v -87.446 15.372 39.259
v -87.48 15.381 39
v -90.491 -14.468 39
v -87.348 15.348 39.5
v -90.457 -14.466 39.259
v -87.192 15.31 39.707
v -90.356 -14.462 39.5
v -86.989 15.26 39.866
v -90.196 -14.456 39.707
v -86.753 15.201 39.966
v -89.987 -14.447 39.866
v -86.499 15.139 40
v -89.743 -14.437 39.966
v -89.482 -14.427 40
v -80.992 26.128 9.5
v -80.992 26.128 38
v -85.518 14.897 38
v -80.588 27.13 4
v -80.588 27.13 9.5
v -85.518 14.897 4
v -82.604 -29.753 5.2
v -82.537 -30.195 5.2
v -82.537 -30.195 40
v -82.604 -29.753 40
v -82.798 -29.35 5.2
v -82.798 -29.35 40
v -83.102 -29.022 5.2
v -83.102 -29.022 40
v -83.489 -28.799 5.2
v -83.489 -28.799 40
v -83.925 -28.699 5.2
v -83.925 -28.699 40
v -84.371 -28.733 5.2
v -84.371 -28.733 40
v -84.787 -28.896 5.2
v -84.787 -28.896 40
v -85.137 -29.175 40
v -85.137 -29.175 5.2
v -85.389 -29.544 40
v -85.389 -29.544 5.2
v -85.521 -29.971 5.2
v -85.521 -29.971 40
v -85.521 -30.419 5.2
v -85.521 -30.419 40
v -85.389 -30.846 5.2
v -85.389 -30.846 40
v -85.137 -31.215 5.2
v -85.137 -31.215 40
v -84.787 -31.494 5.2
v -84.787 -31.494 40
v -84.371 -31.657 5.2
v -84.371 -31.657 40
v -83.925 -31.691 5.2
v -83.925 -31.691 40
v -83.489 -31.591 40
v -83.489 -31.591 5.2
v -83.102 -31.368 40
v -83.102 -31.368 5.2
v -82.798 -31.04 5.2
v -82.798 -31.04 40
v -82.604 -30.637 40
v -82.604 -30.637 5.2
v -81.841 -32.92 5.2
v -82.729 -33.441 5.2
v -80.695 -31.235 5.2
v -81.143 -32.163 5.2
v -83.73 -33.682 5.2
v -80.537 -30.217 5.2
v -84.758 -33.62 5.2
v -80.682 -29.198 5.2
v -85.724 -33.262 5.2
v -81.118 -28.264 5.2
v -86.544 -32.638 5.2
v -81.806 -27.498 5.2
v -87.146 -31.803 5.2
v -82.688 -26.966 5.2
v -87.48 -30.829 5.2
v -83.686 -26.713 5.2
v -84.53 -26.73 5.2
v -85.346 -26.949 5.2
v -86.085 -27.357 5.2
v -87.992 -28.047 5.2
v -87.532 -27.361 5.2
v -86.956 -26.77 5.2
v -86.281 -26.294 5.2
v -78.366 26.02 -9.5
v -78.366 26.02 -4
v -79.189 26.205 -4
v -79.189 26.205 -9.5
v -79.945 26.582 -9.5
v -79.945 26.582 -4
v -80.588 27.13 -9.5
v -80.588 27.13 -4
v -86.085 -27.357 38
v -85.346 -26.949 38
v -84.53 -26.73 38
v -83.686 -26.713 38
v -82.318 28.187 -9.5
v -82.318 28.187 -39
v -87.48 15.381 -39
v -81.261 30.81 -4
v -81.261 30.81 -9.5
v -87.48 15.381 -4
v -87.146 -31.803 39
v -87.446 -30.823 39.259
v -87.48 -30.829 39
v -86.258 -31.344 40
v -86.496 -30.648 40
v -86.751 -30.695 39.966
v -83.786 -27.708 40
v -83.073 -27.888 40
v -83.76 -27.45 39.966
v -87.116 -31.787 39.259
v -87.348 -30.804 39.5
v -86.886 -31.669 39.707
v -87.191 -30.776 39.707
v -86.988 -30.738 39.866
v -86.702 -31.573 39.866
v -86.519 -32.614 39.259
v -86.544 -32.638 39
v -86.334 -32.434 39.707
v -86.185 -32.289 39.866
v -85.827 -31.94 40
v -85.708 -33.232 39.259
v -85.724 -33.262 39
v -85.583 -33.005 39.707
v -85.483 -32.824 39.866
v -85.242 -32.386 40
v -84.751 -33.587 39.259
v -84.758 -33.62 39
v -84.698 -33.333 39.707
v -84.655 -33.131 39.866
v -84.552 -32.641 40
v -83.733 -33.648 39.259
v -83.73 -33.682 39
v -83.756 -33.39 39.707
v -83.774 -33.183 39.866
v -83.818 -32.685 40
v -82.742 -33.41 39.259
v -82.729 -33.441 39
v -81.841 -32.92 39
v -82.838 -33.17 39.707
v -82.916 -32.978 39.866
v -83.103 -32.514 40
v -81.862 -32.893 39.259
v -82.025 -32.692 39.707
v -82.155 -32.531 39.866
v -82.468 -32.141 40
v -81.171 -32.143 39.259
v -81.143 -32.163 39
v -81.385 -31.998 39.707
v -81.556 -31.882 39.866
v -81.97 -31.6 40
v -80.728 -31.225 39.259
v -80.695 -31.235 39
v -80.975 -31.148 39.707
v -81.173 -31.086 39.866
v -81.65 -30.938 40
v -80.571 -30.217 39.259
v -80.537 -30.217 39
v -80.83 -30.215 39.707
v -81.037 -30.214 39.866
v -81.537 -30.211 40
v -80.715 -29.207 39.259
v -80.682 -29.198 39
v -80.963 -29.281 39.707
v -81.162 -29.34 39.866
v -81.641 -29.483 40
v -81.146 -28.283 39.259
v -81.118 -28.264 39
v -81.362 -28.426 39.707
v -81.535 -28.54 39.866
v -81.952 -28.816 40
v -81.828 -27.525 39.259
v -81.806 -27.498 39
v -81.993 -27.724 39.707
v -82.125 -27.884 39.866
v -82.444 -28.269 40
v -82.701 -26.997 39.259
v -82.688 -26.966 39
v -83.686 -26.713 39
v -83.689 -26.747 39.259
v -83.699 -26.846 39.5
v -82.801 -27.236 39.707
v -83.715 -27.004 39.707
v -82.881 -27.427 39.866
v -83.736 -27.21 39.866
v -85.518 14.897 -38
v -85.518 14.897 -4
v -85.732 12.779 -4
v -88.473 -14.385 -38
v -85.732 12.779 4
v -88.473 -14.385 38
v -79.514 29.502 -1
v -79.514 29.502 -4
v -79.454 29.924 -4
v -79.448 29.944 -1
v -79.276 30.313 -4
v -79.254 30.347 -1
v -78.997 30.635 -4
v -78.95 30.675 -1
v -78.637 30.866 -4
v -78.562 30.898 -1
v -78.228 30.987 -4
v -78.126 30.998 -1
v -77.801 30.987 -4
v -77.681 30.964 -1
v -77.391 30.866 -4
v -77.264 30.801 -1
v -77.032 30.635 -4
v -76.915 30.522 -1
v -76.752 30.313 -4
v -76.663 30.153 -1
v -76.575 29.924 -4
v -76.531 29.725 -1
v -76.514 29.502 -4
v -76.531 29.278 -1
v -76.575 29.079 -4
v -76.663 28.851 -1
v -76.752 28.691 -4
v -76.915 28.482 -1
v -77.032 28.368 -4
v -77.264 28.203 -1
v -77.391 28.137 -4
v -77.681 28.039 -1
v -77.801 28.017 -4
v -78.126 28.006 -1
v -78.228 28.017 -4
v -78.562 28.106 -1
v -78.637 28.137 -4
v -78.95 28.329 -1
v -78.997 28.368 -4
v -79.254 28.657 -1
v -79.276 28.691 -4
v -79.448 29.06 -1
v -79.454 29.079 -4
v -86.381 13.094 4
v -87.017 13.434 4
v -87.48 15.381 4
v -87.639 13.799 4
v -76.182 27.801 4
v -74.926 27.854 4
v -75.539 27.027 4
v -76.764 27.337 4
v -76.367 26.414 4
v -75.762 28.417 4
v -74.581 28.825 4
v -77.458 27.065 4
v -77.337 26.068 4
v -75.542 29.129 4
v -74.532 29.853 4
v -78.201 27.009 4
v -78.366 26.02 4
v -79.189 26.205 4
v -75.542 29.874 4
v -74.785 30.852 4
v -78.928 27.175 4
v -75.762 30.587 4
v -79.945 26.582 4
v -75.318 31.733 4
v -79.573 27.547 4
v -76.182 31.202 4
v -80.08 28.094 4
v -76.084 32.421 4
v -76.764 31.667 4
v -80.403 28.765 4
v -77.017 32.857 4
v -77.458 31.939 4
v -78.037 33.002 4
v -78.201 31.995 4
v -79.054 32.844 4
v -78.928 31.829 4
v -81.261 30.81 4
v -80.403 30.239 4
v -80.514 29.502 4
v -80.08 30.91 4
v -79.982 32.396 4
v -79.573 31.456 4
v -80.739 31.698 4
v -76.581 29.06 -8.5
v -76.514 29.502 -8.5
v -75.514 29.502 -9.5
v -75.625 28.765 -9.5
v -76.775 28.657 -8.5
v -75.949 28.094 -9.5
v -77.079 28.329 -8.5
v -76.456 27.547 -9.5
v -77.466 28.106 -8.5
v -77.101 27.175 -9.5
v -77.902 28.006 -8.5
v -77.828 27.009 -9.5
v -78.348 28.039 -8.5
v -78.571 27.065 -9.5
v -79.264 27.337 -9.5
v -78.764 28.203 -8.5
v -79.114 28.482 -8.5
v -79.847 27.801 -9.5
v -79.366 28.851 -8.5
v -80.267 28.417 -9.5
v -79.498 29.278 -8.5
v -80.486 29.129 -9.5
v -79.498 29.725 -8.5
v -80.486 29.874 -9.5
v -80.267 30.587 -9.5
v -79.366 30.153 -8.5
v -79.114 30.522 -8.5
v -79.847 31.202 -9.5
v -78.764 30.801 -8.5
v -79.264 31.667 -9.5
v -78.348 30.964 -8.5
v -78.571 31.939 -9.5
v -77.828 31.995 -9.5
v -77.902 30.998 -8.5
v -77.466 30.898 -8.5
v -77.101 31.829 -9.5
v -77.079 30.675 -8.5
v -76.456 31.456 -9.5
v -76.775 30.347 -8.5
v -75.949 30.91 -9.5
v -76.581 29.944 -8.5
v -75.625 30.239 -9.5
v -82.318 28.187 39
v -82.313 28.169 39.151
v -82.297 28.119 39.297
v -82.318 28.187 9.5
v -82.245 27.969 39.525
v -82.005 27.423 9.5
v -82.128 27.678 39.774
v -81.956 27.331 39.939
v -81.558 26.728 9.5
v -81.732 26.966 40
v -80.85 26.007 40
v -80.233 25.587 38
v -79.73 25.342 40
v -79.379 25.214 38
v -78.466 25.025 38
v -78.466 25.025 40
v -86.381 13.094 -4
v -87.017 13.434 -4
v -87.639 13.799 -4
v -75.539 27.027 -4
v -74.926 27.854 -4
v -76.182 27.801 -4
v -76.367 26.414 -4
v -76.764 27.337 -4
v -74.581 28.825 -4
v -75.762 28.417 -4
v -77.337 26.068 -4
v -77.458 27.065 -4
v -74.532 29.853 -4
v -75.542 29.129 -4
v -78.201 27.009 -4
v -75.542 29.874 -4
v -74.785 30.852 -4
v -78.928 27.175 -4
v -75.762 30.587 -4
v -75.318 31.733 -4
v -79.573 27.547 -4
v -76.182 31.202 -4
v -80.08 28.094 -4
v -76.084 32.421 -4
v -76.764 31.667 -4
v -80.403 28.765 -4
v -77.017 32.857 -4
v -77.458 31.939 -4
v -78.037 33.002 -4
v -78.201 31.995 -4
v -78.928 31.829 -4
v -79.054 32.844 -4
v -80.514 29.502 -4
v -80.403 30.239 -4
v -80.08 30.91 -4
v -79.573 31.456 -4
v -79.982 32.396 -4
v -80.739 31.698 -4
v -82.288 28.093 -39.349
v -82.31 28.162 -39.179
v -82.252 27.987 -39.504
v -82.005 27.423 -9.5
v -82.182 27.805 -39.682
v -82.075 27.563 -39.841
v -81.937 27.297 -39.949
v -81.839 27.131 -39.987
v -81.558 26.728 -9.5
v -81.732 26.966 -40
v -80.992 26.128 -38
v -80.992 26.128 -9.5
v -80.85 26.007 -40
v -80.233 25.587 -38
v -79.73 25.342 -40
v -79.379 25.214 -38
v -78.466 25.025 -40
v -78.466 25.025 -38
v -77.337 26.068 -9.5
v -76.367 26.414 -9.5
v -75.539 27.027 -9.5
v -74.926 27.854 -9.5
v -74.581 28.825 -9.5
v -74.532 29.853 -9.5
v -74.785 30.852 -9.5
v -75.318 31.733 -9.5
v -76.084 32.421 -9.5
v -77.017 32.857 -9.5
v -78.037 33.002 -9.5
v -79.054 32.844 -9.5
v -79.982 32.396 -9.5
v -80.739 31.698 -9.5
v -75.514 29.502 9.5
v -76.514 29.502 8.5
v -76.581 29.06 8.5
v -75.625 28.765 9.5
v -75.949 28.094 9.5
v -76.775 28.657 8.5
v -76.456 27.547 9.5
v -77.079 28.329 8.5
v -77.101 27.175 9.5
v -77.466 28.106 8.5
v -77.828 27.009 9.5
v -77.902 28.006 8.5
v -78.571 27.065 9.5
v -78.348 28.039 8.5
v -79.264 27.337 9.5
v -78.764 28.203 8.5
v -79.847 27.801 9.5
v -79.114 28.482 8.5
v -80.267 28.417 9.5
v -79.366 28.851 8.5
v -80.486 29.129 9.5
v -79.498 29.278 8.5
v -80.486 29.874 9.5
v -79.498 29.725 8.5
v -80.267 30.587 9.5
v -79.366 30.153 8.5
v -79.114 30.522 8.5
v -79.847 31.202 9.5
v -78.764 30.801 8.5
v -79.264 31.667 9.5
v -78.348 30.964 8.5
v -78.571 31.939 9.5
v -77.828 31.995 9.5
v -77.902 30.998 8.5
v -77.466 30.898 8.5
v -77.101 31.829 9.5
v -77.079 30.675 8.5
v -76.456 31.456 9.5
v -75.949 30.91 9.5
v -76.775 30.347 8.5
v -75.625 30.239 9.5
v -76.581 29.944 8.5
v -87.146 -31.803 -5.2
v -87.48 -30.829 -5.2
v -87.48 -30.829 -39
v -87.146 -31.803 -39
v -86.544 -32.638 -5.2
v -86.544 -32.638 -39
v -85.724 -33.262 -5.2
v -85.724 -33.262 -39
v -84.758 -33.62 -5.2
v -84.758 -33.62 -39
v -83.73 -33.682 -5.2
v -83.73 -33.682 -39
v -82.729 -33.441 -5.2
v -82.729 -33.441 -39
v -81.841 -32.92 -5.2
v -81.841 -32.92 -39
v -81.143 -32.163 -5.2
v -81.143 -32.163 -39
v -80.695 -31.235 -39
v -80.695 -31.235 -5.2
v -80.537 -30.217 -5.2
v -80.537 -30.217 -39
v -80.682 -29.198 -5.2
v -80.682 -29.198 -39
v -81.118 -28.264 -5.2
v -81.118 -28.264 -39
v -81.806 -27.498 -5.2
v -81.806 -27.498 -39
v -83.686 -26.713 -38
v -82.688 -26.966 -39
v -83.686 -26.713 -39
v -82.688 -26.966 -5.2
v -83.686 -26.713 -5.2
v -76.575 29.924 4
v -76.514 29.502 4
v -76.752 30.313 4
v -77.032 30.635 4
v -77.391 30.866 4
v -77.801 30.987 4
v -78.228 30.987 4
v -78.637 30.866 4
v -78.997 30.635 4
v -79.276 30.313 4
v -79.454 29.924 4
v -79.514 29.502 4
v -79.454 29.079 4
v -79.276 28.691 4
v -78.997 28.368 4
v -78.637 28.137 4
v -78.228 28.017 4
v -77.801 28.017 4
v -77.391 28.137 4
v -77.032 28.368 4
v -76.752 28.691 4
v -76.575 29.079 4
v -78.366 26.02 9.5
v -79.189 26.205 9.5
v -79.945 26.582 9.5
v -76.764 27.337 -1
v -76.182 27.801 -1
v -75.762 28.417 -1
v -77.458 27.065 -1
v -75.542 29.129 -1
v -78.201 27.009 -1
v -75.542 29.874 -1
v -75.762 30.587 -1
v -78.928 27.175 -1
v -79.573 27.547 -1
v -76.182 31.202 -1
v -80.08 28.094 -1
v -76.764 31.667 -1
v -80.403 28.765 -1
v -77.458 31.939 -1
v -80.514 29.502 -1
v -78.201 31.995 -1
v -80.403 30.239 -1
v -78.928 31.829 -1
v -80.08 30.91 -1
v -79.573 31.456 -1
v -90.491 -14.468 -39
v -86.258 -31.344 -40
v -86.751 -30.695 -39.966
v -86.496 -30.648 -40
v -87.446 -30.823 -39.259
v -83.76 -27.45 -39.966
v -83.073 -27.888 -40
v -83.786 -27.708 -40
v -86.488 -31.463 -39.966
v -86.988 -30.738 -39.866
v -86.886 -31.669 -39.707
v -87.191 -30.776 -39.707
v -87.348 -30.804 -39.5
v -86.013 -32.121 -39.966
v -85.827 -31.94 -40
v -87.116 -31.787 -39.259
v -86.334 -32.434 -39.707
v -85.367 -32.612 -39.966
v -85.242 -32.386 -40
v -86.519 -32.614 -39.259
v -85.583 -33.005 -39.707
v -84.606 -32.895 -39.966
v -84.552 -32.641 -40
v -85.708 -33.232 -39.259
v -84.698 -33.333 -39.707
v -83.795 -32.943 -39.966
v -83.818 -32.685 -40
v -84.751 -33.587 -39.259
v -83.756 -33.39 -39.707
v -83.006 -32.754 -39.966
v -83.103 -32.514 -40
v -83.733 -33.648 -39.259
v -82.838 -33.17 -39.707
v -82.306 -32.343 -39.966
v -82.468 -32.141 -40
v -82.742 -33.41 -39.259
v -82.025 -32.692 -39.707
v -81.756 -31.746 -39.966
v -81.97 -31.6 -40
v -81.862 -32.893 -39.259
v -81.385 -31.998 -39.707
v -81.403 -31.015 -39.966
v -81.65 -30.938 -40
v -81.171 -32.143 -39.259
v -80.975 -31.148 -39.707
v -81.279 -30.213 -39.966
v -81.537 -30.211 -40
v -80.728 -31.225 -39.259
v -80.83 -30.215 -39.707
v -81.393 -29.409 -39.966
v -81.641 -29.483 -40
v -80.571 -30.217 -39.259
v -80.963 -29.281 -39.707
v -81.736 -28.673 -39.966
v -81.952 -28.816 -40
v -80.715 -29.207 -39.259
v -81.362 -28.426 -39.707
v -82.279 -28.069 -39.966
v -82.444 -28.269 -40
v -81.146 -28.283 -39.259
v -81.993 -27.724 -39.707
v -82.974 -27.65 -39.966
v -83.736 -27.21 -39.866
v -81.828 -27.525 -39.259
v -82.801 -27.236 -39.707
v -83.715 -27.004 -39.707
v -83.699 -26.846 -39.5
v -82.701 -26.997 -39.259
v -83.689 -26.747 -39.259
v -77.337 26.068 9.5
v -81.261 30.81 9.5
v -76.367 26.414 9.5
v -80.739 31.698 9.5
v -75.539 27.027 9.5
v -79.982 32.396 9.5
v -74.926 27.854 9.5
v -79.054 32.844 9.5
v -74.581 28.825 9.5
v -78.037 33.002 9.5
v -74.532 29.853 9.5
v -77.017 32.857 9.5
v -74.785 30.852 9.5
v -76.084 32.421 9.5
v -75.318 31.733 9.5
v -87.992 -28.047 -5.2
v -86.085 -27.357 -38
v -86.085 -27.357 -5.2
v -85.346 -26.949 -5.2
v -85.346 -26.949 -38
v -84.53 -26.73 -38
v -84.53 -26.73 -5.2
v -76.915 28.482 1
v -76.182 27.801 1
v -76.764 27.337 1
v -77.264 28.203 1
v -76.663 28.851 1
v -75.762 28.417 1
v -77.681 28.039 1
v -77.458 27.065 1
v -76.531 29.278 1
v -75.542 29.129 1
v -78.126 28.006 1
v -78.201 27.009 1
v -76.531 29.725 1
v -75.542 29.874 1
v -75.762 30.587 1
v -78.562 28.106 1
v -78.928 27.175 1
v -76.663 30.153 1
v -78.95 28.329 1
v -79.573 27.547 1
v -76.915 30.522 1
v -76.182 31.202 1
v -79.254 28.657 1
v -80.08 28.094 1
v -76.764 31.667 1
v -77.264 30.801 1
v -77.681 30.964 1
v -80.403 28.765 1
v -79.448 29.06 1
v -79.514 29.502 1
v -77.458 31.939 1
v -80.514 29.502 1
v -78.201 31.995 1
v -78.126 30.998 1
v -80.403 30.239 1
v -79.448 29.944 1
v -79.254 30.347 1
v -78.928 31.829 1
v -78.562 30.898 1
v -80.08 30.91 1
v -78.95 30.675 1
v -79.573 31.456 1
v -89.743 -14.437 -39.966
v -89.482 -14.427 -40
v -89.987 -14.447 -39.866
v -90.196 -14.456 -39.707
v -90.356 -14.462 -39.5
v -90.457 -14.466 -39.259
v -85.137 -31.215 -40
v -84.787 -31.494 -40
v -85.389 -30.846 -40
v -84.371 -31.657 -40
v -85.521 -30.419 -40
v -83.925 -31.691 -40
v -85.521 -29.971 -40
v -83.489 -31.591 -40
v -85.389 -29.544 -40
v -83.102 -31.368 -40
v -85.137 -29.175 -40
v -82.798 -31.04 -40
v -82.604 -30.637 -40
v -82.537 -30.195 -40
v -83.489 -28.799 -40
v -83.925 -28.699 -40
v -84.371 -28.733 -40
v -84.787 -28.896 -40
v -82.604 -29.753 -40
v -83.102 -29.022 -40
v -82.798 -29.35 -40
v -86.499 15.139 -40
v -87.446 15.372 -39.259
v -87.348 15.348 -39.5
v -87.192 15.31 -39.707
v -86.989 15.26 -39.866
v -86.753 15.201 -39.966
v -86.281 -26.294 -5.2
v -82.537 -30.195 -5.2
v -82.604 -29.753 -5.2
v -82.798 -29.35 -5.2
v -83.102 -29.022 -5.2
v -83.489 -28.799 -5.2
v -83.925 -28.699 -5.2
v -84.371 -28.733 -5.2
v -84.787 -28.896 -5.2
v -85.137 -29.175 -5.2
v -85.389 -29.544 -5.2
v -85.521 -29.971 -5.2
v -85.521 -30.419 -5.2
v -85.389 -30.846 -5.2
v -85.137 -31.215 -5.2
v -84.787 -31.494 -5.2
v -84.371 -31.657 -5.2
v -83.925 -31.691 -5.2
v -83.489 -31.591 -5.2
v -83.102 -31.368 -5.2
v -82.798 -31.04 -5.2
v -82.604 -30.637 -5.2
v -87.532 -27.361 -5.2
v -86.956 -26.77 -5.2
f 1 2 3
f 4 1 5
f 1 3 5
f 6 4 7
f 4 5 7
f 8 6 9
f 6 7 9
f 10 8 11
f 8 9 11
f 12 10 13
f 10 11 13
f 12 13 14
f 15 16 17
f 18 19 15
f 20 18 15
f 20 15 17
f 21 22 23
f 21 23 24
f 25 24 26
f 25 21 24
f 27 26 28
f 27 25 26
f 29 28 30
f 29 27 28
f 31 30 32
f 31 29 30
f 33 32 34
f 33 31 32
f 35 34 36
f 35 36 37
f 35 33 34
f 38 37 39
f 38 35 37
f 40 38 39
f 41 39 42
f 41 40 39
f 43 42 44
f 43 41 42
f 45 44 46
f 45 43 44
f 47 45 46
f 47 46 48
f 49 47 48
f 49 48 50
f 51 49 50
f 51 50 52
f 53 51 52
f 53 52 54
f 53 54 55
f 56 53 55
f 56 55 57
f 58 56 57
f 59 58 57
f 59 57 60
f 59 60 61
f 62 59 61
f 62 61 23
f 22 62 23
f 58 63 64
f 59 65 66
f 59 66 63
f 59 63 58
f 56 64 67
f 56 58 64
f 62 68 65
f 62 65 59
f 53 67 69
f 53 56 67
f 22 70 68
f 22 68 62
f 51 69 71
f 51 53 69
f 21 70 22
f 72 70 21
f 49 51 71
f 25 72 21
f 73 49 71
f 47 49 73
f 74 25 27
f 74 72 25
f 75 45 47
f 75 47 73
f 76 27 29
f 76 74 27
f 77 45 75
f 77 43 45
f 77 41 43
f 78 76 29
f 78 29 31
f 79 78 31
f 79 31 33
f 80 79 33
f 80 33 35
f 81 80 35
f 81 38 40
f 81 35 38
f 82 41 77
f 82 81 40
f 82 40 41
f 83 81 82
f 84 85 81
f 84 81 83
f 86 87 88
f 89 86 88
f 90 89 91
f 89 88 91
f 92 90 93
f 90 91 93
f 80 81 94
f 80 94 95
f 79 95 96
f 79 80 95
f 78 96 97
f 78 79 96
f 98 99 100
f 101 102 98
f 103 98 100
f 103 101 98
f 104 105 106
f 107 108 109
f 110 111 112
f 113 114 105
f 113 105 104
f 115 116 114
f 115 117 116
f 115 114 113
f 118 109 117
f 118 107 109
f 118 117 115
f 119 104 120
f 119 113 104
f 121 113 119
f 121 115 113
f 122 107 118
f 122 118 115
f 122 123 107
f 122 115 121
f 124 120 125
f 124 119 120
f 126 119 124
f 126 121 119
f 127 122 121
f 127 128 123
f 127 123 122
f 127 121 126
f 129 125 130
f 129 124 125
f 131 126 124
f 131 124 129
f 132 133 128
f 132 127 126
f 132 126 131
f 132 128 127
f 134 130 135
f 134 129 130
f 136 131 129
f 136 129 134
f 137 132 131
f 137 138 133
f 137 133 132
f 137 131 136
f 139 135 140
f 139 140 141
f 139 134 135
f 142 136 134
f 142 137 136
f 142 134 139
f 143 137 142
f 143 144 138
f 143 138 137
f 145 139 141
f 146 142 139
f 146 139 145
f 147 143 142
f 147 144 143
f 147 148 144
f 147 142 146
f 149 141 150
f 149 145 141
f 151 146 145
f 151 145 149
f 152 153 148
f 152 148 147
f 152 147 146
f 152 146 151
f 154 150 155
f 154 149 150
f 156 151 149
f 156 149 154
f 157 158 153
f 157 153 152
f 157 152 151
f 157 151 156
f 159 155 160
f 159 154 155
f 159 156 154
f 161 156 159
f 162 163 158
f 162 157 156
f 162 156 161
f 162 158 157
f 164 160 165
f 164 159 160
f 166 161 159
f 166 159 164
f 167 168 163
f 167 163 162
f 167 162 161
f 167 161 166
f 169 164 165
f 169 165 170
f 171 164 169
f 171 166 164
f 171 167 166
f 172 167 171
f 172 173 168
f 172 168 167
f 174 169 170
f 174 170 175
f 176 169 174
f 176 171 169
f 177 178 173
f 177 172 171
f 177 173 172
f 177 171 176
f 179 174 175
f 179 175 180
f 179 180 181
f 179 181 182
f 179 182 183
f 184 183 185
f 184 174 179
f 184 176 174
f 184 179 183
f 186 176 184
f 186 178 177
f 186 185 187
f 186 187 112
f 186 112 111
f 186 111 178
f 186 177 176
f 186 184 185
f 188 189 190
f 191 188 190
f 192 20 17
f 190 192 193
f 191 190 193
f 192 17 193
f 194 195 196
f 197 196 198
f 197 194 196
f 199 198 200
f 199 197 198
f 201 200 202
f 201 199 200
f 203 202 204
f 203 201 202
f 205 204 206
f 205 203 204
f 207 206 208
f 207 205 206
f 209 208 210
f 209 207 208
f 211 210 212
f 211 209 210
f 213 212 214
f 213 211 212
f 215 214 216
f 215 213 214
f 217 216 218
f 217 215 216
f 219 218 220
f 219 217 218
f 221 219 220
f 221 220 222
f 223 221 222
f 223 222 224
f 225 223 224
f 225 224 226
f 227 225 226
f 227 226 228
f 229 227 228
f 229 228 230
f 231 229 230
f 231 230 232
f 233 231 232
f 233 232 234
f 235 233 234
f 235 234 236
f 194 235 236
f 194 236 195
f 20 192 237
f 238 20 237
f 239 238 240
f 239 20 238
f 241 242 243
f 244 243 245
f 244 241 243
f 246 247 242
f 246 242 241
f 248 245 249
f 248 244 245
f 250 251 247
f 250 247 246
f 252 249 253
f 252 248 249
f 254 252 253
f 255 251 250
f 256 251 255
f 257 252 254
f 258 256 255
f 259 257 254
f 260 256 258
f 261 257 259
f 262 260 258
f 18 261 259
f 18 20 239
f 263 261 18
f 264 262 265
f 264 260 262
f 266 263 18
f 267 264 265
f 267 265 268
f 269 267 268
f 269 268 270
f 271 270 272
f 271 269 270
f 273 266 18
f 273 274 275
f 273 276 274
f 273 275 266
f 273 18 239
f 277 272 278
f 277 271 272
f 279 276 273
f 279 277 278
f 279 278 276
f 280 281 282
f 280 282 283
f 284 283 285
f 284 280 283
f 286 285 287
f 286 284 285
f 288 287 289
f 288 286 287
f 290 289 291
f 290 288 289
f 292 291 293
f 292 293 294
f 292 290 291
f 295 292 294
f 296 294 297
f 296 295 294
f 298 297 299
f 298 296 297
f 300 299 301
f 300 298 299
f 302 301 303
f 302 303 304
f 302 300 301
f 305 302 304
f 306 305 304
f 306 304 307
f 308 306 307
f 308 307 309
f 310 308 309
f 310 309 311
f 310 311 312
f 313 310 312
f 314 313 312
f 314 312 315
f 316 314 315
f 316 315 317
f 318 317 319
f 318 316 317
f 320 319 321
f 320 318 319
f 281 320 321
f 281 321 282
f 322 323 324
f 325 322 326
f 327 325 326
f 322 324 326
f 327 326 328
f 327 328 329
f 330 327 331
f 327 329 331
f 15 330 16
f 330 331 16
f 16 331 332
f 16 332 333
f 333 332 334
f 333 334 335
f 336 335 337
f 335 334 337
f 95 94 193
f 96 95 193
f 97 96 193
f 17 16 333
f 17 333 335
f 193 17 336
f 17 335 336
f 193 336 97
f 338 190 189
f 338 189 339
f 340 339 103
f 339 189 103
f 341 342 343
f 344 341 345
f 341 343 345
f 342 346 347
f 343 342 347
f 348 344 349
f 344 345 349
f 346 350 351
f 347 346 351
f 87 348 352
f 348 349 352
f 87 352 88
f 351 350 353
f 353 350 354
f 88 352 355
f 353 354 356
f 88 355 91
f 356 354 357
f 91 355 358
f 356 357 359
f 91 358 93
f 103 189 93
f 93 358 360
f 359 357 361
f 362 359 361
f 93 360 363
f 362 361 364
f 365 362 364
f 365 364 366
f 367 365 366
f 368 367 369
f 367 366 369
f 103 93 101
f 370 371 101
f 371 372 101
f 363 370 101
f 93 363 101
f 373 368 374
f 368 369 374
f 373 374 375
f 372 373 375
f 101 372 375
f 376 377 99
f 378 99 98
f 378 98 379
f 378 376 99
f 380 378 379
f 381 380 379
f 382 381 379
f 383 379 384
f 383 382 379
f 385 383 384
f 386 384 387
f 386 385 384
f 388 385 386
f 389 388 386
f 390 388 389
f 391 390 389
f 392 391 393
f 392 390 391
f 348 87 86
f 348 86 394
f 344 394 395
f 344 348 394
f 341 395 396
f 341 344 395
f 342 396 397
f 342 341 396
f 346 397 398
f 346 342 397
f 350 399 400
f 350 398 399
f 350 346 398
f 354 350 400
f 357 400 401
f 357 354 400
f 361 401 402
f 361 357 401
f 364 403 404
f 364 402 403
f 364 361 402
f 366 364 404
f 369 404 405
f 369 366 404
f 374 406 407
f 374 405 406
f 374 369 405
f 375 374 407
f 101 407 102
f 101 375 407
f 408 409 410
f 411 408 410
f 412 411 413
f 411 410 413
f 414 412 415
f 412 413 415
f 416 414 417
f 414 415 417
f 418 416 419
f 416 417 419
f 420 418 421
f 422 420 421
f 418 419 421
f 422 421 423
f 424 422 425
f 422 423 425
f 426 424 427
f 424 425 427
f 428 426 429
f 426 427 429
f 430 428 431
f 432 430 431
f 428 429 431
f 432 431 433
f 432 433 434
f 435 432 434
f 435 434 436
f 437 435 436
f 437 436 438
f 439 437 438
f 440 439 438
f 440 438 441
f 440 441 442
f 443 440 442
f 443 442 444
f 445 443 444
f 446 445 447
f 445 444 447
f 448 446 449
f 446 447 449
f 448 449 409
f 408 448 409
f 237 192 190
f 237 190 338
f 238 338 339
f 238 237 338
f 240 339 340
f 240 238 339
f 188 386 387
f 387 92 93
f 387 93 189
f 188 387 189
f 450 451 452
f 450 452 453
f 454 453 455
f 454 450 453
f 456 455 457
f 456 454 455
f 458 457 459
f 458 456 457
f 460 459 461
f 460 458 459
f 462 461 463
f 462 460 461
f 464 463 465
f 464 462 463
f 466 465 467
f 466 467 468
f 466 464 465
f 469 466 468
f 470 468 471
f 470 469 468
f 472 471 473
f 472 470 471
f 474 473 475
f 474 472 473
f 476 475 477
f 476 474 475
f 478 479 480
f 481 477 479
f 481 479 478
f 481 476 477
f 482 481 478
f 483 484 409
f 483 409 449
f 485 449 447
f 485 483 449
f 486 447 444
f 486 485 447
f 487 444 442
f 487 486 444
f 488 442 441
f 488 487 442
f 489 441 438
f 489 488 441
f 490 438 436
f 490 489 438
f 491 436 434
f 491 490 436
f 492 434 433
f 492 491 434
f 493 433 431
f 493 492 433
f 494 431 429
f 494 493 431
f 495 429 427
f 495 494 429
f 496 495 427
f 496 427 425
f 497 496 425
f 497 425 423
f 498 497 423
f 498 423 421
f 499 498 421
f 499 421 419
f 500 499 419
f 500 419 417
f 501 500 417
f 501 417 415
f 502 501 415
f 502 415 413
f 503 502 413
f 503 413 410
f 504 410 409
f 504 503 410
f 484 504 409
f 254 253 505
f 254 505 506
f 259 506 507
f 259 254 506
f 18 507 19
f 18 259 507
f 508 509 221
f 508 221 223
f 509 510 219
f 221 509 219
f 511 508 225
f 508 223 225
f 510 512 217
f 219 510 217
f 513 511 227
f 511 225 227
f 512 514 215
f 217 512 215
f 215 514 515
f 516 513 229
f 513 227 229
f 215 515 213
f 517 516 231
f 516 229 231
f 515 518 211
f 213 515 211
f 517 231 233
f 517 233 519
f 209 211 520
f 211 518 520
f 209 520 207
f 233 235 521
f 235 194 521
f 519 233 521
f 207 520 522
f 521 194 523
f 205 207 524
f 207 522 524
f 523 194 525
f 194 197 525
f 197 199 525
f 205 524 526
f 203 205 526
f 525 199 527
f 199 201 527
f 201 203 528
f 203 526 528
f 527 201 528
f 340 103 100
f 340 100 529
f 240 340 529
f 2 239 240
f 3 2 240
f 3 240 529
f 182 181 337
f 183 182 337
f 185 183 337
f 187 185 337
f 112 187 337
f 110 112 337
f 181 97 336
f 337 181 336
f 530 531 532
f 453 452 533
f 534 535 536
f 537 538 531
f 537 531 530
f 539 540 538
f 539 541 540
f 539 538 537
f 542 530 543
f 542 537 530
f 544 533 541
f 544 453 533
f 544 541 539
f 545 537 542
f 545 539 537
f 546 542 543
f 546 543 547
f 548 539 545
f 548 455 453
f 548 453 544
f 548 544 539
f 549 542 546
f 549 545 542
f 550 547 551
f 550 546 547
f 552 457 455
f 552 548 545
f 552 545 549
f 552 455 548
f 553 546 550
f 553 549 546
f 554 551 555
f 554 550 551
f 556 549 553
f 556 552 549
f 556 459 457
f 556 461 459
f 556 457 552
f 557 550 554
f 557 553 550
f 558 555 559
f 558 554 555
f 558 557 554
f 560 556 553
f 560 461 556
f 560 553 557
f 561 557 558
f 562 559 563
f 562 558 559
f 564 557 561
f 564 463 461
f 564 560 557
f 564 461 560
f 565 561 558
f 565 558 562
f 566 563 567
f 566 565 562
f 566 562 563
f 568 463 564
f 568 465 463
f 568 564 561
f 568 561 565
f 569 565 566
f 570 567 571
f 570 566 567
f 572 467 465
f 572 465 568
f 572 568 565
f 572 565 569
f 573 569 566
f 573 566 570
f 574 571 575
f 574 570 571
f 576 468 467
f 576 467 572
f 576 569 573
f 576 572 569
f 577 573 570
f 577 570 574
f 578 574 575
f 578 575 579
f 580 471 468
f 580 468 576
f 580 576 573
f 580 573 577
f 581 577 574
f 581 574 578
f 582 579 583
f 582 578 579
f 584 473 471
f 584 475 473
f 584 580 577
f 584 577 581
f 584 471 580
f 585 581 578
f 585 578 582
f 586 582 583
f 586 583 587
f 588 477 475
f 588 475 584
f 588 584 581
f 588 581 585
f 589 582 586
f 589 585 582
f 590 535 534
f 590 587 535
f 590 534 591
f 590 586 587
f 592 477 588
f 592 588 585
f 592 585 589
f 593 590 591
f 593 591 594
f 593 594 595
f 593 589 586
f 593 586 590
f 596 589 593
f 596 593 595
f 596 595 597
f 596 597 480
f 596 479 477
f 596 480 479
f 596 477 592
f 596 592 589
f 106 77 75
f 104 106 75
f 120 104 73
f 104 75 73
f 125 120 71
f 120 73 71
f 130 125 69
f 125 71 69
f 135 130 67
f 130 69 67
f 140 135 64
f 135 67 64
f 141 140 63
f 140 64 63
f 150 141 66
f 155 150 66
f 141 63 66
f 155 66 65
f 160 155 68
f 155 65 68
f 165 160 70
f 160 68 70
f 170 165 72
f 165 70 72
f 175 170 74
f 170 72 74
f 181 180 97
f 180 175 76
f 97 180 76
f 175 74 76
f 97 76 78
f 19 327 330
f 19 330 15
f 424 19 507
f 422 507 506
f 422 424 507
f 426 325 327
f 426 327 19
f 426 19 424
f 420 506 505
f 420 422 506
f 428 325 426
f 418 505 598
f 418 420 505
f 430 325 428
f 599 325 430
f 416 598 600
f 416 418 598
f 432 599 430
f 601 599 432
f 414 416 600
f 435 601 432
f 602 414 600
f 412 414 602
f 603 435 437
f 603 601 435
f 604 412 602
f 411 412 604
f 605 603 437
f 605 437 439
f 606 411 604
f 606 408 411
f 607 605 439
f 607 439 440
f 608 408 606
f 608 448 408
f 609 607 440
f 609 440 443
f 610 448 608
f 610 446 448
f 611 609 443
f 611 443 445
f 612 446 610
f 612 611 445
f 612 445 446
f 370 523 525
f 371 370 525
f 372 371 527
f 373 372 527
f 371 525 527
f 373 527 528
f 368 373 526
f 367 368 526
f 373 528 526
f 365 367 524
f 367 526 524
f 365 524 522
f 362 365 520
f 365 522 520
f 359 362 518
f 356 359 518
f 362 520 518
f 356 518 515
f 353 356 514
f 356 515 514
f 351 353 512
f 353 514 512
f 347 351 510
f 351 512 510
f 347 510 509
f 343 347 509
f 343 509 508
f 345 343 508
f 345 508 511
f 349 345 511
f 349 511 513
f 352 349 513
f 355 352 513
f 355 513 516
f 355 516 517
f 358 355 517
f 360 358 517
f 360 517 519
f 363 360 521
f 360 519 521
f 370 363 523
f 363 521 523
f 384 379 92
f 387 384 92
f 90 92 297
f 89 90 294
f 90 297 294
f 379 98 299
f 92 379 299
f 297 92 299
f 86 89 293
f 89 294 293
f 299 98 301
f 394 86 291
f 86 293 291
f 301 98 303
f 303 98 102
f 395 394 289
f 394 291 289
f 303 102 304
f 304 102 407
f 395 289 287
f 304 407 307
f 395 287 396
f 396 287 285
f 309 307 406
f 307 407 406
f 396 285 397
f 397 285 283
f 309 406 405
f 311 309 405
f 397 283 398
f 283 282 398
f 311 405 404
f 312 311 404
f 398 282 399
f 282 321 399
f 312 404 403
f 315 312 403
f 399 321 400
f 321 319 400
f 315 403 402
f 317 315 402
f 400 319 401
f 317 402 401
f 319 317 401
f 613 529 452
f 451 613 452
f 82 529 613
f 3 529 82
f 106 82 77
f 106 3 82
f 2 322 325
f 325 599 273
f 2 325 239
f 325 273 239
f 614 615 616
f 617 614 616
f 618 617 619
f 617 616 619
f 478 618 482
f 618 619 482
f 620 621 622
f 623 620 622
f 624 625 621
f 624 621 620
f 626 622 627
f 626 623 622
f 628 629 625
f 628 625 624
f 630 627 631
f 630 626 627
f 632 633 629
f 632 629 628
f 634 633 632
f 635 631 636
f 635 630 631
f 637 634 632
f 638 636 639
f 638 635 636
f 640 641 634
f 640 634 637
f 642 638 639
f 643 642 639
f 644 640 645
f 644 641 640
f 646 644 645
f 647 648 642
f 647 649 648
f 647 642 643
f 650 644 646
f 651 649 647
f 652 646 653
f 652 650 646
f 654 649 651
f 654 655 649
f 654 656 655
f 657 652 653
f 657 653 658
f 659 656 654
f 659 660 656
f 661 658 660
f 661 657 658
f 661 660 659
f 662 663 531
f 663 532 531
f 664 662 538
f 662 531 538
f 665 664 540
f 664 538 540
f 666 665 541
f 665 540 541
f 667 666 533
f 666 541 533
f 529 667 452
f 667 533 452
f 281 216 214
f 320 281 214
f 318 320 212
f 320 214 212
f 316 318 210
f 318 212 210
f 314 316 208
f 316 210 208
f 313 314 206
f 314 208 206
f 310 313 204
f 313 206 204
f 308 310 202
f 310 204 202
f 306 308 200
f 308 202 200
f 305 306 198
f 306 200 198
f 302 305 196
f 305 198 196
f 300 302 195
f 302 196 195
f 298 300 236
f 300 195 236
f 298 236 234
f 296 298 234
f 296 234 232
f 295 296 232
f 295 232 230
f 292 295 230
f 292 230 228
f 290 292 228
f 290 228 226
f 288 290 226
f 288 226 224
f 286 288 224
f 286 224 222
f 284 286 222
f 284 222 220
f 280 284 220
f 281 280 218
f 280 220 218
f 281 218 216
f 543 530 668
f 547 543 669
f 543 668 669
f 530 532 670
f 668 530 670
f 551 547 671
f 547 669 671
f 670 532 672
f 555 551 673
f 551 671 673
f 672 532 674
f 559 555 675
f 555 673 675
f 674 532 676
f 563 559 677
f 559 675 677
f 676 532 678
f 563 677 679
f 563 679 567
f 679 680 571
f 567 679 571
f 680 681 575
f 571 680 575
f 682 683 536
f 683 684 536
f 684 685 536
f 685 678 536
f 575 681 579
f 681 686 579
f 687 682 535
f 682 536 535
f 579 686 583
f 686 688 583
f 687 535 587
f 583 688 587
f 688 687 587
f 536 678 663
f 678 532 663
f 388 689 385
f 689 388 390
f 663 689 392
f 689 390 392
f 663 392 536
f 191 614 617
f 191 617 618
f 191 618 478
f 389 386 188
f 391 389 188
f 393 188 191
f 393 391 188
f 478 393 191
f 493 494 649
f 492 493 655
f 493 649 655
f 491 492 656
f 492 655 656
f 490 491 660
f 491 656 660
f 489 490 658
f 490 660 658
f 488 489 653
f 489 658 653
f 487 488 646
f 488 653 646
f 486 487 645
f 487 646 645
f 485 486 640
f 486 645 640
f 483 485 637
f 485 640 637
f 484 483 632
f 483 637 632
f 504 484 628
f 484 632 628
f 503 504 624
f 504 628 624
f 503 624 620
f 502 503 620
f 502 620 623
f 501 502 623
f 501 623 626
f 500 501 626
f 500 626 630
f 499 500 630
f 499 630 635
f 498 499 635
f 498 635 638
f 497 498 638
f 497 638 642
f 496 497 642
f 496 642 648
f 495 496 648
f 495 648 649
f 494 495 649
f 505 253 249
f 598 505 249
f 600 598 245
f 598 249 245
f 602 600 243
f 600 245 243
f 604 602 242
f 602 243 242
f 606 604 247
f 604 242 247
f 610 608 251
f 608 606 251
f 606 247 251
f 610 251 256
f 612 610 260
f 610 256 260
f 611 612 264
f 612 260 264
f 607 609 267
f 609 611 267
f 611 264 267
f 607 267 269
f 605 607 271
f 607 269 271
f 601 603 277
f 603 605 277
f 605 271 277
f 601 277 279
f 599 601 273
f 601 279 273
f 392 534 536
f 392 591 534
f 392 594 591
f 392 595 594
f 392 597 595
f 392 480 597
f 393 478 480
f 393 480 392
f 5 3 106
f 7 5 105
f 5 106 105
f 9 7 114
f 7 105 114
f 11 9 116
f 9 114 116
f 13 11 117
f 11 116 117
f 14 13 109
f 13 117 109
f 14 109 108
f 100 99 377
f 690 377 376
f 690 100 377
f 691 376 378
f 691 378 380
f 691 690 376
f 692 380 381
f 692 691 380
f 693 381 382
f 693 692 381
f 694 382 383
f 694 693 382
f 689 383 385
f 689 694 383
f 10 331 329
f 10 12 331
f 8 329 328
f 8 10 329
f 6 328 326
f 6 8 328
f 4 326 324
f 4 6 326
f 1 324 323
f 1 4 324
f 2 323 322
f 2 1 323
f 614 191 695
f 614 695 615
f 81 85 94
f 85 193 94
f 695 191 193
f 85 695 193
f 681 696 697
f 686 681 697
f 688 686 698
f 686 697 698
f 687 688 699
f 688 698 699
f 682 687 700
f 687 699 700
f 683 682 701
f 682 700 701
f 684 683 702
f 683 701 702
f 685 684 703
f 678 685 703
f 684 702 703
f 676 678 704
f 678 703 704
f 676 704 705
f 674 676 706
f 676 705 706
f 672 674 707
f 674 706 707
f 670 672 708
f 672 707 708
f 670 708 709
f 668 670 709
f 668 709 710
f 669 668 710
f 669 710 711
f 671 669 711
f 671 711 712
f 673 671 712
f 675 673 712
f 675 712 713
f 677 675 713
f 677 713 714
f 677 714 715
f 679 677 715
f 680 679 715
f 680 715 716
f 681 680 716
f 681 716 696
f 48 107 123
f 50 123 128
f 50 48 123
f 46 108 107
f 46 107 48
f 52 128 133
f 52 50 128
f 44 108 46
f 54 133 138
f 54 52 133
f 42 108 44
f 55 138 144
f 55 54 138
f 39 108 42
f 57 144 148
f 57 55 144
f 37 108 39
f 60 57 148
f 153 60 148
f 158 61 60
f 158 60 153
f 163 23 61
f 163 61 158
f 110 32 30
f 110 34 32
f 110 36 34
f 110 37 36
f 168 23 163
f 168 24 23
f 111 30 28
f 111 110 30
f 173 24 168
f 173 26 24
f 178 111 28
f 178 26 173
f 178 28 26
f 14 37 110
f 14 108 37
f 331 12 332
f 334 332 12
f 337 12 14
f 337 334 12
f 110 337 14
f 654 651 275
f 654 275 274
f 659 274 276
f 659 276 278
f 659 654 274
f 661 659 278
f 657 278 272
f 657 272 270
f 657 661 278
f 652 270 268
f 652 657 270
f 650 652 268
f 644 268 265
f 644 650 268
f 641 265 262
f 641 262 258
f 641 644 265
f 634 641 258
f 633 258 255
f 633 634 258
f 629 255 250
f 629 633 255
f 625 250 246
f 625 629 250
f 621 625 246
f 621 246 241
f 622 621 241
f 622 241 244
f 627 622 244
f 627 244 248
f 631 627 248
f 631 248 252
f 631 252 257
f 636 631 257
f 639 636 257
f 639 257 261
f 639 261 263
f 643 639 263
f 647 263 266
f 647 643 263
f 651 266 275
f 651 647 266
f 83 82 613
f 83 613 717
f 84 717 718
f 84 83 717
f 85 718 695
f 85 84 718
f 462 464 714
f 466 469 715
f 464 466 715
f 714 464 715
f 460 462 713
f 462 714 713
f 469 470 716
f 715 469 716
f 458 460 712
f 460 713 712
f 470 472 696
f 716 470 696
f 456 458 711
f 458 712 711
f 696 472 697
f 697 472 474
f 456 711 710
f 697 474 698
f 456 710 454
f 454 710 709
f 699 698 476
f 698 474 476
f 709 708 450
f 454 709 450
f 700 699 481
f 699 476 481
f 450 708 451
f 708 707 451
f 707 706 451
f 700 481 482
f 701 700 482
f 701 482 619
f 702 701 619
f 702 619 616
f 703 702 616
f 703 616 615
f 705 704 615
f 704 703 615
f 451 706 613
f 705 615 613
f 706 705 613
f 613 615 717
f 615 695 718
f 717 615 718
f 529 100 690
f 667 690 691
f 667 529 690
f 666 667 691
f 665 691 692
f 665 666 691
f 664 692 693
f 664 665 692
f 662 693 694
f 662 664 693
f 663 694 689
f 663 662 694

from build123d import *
from build123d.topology import SkipClean

# Parameters (mm, degrees)
CROQUIS2_R              = 1.5
SALIENTE_EXTRUIR1_DEPTH = 40
CORTAR_EXTRUIR8_DEPTH   = 38
CROQUIS21_R             = 4.5
CORTAR_EXTRUIR9_DEPTH   = 30.5
CHAFL_N1_SIZE           = 1
CROQUIS22_R             = 18.418021377
CORTAR_EXTRUIR10_DEPTH  = 4
SALIENTE_EXTRUIR2_START = 3
CROQUIS23_R             = 2.5
CROQUIS23_R_2           = 1.5
SALIENTE_EXTRUIR2_DEPTH = 3
CROQUIS24_R             = 4.5
CORTAR_EXTRUIR11_DEPTH  = 5.2
REDONDEO_CABLE_PLANO_R  = 1


with BuildPart() as part:
    # Croquis2 → Saliente-Extruir1 (new body)
    with BuildSketch(Plane.XY):
        with BuildLine():
            Line((-81.260569926, 30.810305605), (-87.479685276, 15.380704046))
            Line((-87.479685276, 15.380704046), (-90.491189661, -14.467760593))
            Line((-90.491189661, -14.467760593), (-87.479519283, -30.828684819))
            ThreePointArc((-87.479519283, -30.828684819), (-81.463725094, -32.56707429), (-83.686009105, -26.712739874))
            Line((-83.686009105, -26.712739874), (-78.365684691, 26.019547656))
            ThreePointArc((-78.365684691, 26.019547656), (-75.018767914, 31.311988091), (-81.260569926, 30.810305605))
        make_face()
        with Locations((-78.014342512, 29.50186853)):
            Circle(CROQUIS2_R, mode=Mode.SUBTRACT)
        with Locations((-84.037351283, -30.195060749)):
            Circle(CROQUIS2_R, mode=Mode.SUBTRACT)
    extrude(amount=SALIENTE_EXTRUIR1_DEPTH)

    # Croquis20 → Cortar-Extruir8 (cut)
    with BuildSketch(Plane(origin=(0, 0, 0), x_dir=(-1, 0, 0), z_dir=(0, 0, -1))):
        with BuildLine():
            Line((80.58776607, 27.129635154), (85.518345507, 14.896886302))
            Line((85.518345507, 14.896886302), (88.472734145, -14.385476766))
            Line((88.472734145, -14.385476766), (86.085050495, -27.356587931))
            ThreePointArc((86.085050495, -27.356587931), (84.944567837, -26.814682349), (83.686009105, -26.712739874))
            Line((83.686009105, -26.712739874), (78.365684691, 26.019547656))
            ThreePointArc((78.365684691, 26.019547656), (79.578515526, 26.370836307), (80.58776607, 27.129635154))
        make_face()
    extrude(amount=-CORTAR_EXTRUIR8_DEPTH, mode=Mode.SUBTRACT)

    # Croquis21 → Cortar-Extruir9 (cut)
    with BuildSketch(Plane.XY.offset(40)):
        with Locations((-78.014342512, 29.50186853)):
            Circle(CROQUIS21_R)
    extrude(amount=-CORTAR_EXTRUIR9_DEPTH, mode=Mode.SUBTRACT)

    # Chaflán1
    chafl_n1_edges = [part.edges().sort_by_distance(p)[0] for p in [
        (-79.514342512, 29.50186853, 9.5),
    ]]
    chamfer(chafl_n1_edges, length=CHAFL_N1_SIZE)

    # Croquis22 → Cortar-Extruir10 (cut)
    with BuildSketch(Plane(origin=(0, 0, 0), x_dir=(-1, 0, 0), z_dir=(0, 0, -1))):
        with Locations((78.014342512, 29.50186853)):
            Circle(CROQUIS22_R)
    extrude(amount=-CORTAR_EXTRUIR10_DEPTH, mode=Mode.SUBTRACT)

    # Croquis23 → Saliente-Extruir2 (add)
    with SkipClean():  # the faces are left unmerged after this step: merging them gives an invalid solid
        with BuildSketch(Plane(origin=(0, 0, 4), x_dir=(-1, 0, 0), z_dir=(0, 0, -1)).offset(SALIENTE_EXTRUIR2_START)):
            with Locations((78.014342512, 29.50186853)):
                Circle(CROQUIS23_R)
            with Locations((78.014342512, 29.50186853)):
                Circle(CROQUIS23_R_2, mode=Mode.SUBTRACT)
        extrude(amount=-SALIENTE_EXTRUIR2_DEPTH)

    # Croquis24 → Cortar-Extruir11 (cut)
    with SkipClean():  # the faces are left unmerged after this step: merging them gives an invalid solid
        with BuildSketch(Plane(origin=(0, 0, 0), x_dir=(-1, 0, 0), z_dir=(0, 0, -1))):
            with Locations((84.037351283, -30.195060749)):
                Circle(CROQUIS24_R)
        extrude(amount=-CORTAR_EXTRUIR11_DEPTH, mode=Mode.SUBTRACT)

    # Simetría1: part across plane


with BuildPart() as part_1:
    with SkipClean():  # the faces are left unmerged after this step: merging them gives an invalid solid
        add(part.part)
        add(part.part.mirror(Plane(origin=(-78.014342512, 29.50186853, 0), x_dir=(1, 0, 0), z_dir=(0, 0, -1))))

    # Redondeo Cable plano
    redondeo_cable_plano_edges = [part_1.edges().sort_by_distance(p)[0] for p in [
        (-81.463725094, -32.56707429, -40),
        (-84.898816017, 21.783830873, -40),
        (-88.985437468, 0.456471727, -40),
        (-88.985354472, -22.648222706, -40),
        (-88.985437468, 0.456471727, 40),
        (-88.985354472, -22.648222706, 40),
        (-81.463725094, -32.56707429, 40),
        (-84.898816017, 21.783830873, 40),
    ]]
    fillet(redondeo_cable_plano_edges, radius=REDONDEO_CABLE_PLANO_R)


solid = part_1.part
